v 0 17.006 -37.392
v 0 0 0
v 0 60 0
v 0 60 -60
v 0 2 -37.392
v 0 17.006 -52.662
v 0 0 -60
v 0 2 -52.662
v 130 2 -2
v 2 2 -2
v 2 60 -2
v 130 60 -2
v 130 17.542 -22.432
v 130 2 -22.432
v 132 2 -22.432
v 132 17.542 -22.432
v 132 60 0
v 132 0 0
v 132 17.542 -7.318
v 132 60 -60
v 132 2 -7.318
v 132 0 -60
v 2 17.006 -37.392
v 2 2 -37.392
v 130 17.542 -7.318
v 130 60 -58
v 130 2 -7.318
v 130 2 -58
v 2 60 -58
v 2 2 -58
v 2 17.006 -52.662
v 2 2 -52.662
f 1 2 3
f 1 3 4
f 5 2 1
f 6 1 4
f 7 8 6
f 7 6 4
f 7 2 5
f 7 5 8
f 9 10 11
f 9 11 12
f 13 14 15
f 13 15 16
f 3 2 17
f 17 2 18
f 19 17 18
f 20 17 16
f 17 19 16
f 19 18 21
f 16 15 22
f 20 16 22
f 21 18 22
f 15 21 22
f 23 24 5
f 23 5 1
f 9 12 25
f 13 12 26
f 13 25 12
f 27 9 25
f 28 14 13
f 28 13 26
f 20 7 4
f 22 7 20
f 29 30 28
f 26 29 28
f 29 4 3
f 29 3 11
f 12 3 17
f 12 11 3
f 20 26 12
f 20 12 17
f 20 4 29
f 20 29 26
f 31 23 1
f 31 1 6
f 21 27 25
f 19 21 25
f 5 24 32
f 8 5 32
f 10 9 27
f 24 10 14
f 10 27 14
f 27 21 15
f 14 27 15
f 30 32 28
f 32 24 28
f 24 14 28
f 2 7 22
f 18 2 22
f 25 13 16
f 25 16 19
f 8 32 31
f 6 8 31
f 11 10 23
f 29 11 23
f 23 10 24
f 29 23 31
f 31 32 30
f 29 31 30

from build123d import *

# Parameters (mm, degrees)
ESQUISSE1_W             = 132
ESQUISSE1_H             = 60
BOSS_EXTRU_1_DEPTH      = 60
COQUE1_T                = -2
ESQUISSE2_W             = 15.270123606
ESQUISSE2_H             = 15.006197758
ENL_V_MAT_EXTRU_3_DEPTH = 150
ESQUISSE3_W             = 15.1141578
ESQUISSE3_H             = 15.542141472
ENL_V_MAT_EXTRU_4_DEPTH = 150


with BuildPart() as part:
    # Esquisse1 → Boss.-Extru.1 (new body)
    with BuildSketch(Plane(origin=(0, 0, 0), x_dir=(1, 0, 0), z_dir=(0, 1, 0))):
        with Locations((66, 30)):
            Rectangle(ESQUISSE1_W, ESQUISSE1_H)
    extrude(amount=BOSS_EXTRU_1_DEPTH)

    # Coque1
    coque1_openings = [part.faces().sort_by_distance(p)[0] for p in [
        (66, 60, -30),
    ]]
    offset(amount=COQUE1_T, openings=coque1_openings, kind=Kind.INTERSECTION)

    # Esquisse2 → Enlèv. mat.-Extru.3 (cut)
    with BuildSketch(Plane(origin=(2, 0, 0), x_dir=(0, 0, -1), z_dir=(1, 0, 0))):
        with Locations((45.027247918, 9.503098879)):
            Rectangle(ESQUISSE2_W, ESQUISSE2_H)
    extrude(amount=-ENL_V_MAT_EXTRU_3_DEPTH, mode=Mode.SUBTRACT)

    # Esquisse3 → Enlèv. mat.-Extru.4 (cut)
    with BuildSketch(Plane.ZY.offset(-130)):
        with Locations((-14.874699742, 9.771070736)):
            Rectangle(ESQUISSE3_W, ESQUISSE3_H)
    extrude(amount=-ENL_V_MAT_EXTRU_4_DEPTH, mode=Mode.SUBTRACT)


solid = part.part
